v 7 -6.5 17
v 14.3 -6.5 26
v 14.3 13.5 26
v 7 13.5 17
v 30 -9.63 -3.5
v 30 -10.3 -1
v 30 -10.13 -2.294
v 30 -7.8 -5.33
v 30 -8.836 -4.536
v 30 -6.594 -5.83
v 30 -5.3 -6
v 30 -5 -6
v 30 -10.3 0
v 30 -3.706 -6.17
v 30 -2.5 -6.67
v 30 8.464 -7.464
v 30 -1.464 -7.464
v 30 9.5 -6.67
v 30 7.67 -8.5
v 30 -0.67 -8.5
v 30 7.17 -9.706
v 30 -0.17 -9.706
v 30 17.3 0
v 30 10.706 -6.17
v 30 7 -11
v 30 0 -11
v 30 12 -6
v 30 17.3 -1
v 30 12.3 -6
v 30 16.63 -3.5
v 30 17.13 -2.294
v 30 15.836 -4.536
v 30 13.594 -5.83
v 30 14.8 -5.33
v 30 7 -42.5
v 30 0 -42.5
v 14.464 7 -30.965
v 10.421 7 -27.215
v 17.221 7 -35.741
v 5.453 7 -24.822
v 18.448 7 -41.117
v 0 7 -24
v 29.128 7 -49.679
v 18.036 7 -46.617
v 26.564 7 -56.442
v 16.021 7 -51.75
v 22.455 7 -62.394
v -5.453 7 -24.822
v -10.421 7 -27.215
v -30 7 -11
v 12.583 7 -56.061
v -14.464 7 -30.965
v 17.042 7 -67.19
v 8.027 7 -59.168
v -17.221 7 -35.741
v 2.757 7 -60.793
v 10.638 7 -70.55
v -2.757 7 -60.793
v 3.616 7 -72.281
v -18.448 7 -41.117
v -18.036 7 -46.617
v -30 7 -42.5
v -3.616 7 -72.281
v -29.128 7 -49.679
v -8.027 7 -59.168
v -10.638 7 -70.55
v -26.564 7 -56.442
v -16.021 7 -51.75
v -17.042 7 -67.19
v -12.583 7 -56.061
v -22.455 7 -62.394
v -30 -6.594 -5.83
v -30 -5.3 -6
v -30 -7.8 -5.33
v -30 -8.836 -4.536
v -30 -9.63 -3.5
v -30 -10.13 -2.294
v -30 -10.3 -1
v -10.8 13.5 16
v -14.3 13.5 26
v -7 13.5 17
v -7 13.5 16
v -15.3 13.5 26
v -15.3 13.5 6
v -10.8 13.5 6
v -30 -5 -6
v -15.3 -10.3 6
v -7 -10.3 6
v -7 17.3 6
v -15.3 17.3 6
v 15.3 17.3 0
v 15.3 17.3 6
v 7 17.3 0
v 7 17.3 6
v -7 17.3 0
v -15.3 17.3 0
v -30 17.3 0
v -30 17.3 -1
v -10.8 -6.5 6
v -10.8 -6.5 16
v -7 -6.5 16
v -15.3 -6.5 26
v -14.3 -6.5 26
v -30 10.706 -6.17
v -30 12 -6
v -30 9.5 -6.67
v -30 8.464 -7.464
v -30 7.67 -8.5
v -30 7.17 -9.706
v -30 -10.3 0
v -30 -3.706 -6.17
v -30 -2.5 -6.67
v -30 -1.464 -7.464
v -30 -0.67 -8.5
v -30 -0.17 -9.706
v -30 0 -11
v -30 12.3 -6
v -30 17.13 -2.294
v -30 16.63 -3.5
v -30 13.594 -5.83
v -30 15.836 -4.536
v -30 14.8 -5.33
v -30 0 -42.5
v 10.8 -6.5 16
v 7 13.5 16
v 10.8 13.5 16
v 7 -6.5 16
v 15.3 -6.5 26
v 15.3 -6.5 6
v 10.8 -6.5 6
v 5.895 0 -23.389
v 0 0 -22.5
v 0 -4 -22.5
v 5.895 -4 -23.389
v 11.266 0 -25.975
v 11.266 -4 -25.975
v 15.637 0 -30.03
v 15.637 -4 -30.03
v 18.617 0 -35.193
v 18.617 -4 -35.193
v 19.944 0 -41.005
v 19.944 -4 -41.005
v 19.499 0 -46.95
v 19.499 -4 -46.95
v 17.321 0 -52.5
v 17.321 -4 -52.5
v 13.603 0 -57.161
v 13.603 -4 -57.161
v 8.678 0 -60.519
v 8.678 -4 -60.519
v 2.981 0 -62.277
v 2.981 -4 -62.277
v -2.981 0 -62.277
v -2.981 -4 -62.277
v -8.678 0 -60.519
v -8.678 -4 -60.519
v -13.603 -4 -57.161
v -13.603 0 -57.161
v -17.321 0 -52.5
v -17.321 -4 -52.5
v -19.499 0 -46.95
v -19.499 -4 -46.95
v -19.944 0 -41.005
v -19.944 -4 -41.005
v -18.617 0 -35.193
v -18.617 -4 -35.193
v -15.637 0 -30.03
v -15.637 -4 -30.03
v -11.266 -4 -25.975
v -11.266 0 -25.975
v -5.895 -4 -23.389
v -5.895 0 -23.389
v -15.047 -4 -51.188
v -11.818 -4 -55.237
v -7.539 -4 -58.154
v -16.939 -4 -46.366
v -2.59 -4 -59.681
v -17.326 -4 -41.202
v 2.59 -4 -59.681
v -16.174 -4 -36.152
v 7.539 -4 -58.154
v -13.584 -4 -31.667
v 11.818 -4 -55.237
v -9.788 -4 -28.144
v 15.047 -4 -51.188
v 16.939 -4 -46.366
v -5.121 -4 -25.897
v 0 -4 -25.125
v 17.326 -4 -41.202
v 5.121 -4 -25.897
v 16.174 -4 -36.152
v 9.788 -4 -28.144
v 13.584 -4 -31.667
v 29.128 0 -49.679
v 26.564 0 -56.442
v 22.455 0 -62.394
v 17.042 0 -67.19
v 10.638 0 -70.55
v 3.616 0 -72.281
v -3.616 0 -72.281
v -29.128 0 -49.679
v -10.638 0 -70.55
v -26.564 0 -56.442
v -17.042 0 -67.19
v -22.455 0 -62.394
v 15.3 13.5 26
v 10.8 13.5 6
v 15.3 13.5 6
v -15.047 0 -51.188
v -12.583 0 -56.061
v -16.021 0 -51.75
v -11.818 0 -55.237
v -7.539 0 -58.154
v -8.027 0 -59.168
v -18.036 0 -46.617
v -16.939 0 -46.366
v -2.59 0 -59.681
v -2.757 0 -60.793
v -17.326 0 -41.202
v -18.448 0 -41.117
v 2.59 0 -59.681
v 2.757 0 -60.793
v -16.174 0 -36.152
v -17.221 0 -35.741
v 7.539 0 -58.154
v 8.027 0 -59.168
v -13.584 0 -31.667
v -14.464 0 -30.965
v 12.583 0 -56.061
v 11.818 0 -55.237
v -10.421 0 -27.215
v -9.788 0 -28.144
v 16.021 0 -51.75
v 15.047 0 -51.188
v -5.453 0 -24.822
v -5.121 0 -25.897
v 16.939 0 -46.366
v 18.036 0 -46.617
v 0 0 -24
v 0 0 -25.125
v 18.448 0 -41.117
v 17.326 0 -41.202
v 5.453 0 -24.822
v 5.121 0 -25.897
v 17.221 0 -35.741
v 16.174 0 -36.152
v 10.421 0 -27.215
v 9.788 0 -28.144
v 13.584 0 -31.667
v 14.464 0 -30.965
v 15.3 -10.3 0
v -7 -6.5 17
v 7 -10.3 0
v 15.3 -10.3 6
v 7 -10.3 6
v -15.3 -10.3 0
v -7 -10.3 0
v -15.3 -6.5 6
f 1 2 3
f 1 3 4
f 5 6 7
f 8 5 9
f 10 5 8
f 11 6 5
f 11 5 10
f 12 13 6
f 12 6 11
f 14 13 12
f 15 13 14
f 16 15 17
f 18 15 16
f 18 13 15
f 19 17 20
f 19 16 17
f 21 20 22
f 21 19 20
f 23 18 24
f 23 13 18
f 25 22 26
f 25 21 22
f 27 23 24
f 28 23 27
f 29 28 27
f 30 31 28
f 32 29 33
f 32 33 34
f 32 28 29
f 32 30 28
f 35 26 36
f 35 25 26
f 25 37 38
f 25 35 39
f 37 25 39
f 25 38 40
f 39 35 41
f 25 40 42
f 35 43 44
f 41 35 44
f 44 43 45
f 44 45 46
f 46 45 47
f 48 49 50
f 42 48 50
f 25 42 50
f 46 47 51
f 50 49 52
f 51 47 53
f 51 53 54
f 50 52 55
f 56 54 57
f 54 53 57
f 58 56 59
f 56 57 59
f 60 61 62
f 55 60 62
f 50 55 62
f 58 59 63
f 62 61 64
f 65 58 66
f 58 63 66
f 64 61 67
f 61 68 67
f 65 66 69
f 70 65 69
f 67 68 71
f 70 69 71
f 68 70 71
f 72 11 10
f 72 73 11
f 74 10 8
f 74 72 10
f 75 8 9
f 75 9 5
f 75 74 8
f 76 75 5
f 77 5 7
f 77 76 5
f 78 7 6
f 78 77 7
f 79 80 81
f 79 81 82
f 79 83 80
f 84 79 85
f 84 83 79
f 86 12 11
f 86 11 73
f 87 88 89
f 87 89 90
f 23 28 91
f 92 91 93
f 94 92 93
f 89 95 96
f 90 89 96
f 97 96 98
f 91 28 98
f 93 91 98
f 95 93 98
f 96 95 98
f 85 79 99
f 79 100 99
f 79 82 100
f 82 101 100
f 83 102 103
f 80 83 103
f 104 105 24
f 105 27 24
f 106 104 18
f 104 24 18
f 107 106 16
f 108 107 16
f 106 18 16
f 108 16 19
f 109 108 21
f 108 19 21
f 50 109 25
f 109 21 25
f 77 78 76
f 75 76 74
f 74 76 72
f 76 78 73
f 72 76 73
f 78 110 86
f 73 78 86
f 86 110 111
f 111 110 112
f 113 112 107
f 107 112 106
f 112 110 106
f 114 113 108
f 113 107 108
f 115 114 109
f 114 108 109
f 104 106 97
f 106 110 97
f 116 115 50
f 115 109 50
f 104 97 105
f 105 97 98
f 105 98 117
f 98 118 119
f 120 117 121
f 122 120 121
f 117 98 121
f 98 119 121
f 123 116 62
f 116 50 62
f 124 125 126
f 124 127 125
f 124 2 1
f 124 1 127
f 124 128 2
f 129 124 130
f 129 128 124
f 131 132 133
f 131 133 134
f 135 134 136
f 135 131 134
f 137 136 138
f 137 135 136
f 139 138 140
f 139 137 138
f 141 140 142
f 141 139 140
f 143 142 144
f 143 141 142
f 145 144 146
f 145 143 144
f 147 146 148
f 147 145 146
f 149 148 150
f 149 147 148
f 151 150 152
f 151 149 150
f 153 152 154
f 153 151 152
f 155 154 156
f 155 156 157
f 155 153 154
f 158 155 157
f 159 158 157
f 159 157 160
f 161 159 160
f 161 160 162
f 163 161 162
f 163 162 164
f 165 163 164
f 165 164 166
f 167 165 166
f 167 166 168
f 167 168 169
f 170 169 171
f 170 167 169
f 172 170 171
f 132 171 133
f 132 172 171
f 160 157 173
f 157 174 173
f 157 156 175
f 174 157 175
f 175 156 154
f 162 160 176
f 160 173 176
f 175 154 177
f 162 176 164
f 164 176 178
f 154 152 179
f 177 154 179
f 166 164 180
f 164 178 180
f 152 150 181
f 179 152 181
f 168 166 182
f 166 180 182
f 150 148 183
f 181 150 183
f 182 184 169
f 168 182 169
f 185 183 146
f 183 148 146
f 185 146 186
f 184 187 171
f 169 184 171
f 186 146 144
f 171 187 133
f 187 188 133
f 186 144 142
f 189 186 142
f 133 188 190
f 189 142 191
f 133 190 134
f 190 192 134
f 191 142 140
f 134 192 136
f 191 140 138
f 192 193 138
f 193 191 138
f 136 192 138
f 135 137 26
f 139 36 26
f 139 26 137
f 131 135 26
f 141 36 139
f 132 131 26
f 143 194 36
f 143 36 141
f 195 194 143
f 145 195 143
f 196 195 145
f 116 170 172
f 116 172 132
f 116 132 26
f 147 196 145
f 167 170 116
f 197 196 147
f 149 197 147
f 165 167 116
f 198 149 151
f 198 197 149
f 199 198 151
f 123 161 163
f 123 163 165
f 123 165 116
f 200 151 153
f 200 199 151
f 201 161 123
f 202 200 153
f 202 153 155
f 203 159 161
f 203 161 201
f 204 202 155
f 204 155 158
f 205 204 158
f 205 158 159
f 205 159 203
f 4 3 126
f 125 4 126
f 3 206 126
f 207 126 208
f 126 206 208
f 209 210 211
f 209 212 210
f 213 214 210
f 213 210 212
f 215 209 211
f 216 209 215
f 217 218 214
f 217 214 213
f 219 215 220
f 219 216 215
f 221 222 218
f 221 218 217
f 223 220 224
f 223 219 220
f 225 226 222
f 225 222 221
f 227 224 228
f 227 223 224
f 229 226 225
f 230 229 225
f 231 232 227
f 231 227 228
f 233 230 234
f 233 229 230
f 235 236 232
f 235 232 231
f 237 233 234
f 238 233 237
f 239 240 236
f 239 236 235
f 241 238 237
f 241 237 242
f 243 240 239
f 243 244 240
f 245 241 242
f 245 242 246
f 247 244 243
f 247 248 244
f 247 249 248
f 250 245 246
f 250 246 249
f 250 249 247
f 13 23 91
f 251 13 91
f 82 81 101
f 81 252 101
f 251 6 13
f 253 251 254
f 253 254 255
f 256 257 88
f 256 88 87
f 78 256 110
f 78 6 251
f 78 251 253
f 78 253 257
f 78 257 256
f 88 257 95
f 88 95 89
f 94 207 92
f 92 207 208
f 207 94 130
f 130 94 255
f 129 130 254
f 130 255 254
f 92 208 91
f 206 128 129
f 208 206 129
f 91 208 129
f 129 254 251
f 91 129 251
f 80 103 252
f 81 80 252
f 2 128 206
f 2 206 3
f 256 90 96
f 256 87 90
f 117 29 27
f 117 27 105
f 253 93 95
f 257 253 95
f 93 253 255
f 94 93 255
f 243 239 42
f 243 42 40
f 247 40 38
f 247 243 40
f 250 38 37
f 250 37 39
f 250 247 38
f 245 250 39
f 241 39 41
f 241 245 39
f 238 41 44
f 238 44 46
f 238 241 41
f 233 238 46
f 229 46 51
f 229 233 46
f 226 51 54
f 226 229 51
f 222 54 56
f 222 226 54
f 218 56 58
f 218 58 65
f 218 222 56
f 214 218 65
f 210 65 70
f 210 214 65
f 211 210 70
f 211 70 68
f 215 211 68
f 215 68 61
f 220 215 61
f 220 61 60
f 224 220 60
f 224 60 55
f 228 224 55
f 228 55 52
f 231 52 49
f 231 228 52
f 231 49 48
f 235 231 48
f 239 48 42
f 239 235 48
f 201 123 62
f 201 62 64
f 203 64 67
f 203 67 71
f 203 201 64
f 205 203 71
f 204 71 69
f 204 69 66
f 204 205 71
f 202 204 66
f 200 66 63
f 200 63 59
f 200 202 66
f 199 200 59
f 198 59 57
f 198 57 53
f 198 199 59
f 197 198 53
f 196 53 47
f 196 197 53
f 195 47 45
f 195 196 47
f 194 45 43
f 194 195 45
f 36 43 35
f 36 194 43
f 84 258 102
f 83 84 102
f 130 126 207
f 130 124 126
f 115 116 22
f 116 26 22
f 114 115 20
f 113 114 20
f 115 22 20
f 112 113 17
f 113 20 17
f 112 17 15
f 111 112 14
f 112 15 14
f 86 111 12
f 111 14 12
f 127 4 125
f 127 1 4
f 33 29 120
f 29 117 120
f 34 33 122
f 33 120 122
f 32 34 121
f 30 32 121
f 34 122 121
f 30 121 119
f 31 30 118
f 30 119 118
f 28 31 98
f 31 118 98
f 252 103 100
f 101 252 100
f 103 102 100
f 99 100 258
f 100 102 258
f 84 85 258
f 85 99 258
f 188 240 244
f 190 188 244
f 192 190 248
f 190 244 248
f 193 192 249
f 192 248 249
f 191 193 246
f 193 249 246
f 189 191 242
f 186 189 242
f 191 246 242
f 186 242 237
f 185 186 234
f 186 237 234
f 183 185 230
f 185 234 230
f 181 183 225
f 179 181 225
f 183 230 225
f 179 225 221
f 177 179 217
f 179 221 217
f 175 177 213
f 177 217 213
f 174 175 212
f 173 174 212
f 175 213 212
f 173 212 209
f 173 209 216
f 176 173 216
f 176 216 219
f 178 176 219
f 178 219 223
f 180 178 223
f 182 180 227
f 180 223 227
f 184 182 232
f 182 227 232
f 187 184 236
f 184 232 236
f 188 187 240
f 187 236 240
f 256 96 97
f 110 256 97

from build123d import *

# Parameters (mm, degrees)
SKETCH1_R           = 18.5
BOSS_EXTRUDE1_DEPTH = 7
BOSS_EXTRUDE3_DEPTH = 10
BOSS_EXTRUDE4_DEPTH = 13.8
BOSS_EXTRUDE5_START = -13.8
SKETCH4_W           = 60
SKETCH4_H           = 6
BOSS_EXTRUDE5_DEPTH = 27.6
FILLET2_R           = 5
SKETCH5_R           = 20
SKETCH5_R_2         = 17.375
BOSS_EXTRUDE6_DEPTH = 4


with BuildPart() as part:
    # Sketch1 → Boss-Extrude1 (new body)
    with BuildSketch(Plane(origin=(0, 0, 0), x_dir=(1, 0, 0), z_dir=(0, 1, 0))):
        with BuildLine():
            Line((-30, 0), (-30, 42.5))
            ThreePointArc((-30, 42.5), (0, 72.5), (30, 42.5))
            Line((30, 42.5), (30, 0))
            Line((30, 0), (-30, 0))
        make_face()
        with Locations(Location((0, 42.5, 0), (0, 0, 270))):
            Circle(SKETCH1_R, mode=Mode.SUBTRACT)
    extrude(amount=BOSS_EXTRUDE1_DEPTH)

    # Sketch3<3> → Boss-Extrude4 (add, symmetric)
    with BuildSketch(Plane(origin=(-4, 3.5, 0), x_dir=(0, 0, 1), z_dir=(0, -1, 0))):
        Polygon((0, 11.3), (0, 3), (6, 3), (6, 6.8), (6, 11.3), align=None)
    boss_extrude4 = extrude(amount=BOSS_EXTRUDE4_DEPTH, both=True)

    # Mirror8: Boss-Extrude4 across plane
    add(boss_extrude4.mirror(Plane.ZY))


with BuildPart() as body_2:
    # Sketch3 → Boss-Extrude3 (new, symmetric)
    with BuildSketch(Plane(origin=(-4, 3.5, 0), x_dir=(0, 0, 1), z_dir=(0, -1, 0))):
        Polygon((26, 10.3), (17, 3), (16, 3), (16, 6.8), (6, 6.8), (6, 11.3), (26, 11.3), align=None)
    boss_extrude3 = extrude(amount=BOSS_EXTRUDE3_DEPTH, both=True)


with BuildPart() as part_1:
    add(part.part)

    # Mirror9: Boss-Extrude3 across plane
    add(boss_extrude3.mirror(Plane.ZY))

    # Sketch4 → Boss-Extrude5 (add)
    with BuildSketch(Plane(origin=(0, 3.5, 0), x_dir=(-1, 0, 0), z_dir=(0, -1, 0)).offset(BOSS_EXTRUDE5_START)):
        with Locations((0, 3)):
            Rectangle(SKETCH4_W, SKETCH4_H)
    extrude(amount=BOSS_EXTRUDE5_DEPTH)

    # Fillet2
    fillet2_edges = [part_1.edges().sort_by_distance(p)[0] for p in [
        (0, 17.3, -6),
        (0, 7, -6),
        (0, 0, -6),
        (0, -10.3, -6),
    ]]
    fillet(fillet2_edges, radius=FILLET2_R)

    # Sketch5 → Boss-Extrude6 (add)
    with BuildSketch(Plane(origin=(0, 0, 0), x_dir=(1, 0, 0), z_dir=(0, 1, 0))):
        with Locations(Location((0, 42.5, 0), (0, 0, 270))):
            Circle(SKETCH5_R)
        with Locations(Location((0, 42.5, 0), (0, 0, 270))):
            Circle(SKETCH5_R_2, mode=Mode.SUBTRACT)
    extrude(amount=-BOSS_EXTRUDE6_DEPTH)


solid = Compound([body_2.part, part_1.part])
